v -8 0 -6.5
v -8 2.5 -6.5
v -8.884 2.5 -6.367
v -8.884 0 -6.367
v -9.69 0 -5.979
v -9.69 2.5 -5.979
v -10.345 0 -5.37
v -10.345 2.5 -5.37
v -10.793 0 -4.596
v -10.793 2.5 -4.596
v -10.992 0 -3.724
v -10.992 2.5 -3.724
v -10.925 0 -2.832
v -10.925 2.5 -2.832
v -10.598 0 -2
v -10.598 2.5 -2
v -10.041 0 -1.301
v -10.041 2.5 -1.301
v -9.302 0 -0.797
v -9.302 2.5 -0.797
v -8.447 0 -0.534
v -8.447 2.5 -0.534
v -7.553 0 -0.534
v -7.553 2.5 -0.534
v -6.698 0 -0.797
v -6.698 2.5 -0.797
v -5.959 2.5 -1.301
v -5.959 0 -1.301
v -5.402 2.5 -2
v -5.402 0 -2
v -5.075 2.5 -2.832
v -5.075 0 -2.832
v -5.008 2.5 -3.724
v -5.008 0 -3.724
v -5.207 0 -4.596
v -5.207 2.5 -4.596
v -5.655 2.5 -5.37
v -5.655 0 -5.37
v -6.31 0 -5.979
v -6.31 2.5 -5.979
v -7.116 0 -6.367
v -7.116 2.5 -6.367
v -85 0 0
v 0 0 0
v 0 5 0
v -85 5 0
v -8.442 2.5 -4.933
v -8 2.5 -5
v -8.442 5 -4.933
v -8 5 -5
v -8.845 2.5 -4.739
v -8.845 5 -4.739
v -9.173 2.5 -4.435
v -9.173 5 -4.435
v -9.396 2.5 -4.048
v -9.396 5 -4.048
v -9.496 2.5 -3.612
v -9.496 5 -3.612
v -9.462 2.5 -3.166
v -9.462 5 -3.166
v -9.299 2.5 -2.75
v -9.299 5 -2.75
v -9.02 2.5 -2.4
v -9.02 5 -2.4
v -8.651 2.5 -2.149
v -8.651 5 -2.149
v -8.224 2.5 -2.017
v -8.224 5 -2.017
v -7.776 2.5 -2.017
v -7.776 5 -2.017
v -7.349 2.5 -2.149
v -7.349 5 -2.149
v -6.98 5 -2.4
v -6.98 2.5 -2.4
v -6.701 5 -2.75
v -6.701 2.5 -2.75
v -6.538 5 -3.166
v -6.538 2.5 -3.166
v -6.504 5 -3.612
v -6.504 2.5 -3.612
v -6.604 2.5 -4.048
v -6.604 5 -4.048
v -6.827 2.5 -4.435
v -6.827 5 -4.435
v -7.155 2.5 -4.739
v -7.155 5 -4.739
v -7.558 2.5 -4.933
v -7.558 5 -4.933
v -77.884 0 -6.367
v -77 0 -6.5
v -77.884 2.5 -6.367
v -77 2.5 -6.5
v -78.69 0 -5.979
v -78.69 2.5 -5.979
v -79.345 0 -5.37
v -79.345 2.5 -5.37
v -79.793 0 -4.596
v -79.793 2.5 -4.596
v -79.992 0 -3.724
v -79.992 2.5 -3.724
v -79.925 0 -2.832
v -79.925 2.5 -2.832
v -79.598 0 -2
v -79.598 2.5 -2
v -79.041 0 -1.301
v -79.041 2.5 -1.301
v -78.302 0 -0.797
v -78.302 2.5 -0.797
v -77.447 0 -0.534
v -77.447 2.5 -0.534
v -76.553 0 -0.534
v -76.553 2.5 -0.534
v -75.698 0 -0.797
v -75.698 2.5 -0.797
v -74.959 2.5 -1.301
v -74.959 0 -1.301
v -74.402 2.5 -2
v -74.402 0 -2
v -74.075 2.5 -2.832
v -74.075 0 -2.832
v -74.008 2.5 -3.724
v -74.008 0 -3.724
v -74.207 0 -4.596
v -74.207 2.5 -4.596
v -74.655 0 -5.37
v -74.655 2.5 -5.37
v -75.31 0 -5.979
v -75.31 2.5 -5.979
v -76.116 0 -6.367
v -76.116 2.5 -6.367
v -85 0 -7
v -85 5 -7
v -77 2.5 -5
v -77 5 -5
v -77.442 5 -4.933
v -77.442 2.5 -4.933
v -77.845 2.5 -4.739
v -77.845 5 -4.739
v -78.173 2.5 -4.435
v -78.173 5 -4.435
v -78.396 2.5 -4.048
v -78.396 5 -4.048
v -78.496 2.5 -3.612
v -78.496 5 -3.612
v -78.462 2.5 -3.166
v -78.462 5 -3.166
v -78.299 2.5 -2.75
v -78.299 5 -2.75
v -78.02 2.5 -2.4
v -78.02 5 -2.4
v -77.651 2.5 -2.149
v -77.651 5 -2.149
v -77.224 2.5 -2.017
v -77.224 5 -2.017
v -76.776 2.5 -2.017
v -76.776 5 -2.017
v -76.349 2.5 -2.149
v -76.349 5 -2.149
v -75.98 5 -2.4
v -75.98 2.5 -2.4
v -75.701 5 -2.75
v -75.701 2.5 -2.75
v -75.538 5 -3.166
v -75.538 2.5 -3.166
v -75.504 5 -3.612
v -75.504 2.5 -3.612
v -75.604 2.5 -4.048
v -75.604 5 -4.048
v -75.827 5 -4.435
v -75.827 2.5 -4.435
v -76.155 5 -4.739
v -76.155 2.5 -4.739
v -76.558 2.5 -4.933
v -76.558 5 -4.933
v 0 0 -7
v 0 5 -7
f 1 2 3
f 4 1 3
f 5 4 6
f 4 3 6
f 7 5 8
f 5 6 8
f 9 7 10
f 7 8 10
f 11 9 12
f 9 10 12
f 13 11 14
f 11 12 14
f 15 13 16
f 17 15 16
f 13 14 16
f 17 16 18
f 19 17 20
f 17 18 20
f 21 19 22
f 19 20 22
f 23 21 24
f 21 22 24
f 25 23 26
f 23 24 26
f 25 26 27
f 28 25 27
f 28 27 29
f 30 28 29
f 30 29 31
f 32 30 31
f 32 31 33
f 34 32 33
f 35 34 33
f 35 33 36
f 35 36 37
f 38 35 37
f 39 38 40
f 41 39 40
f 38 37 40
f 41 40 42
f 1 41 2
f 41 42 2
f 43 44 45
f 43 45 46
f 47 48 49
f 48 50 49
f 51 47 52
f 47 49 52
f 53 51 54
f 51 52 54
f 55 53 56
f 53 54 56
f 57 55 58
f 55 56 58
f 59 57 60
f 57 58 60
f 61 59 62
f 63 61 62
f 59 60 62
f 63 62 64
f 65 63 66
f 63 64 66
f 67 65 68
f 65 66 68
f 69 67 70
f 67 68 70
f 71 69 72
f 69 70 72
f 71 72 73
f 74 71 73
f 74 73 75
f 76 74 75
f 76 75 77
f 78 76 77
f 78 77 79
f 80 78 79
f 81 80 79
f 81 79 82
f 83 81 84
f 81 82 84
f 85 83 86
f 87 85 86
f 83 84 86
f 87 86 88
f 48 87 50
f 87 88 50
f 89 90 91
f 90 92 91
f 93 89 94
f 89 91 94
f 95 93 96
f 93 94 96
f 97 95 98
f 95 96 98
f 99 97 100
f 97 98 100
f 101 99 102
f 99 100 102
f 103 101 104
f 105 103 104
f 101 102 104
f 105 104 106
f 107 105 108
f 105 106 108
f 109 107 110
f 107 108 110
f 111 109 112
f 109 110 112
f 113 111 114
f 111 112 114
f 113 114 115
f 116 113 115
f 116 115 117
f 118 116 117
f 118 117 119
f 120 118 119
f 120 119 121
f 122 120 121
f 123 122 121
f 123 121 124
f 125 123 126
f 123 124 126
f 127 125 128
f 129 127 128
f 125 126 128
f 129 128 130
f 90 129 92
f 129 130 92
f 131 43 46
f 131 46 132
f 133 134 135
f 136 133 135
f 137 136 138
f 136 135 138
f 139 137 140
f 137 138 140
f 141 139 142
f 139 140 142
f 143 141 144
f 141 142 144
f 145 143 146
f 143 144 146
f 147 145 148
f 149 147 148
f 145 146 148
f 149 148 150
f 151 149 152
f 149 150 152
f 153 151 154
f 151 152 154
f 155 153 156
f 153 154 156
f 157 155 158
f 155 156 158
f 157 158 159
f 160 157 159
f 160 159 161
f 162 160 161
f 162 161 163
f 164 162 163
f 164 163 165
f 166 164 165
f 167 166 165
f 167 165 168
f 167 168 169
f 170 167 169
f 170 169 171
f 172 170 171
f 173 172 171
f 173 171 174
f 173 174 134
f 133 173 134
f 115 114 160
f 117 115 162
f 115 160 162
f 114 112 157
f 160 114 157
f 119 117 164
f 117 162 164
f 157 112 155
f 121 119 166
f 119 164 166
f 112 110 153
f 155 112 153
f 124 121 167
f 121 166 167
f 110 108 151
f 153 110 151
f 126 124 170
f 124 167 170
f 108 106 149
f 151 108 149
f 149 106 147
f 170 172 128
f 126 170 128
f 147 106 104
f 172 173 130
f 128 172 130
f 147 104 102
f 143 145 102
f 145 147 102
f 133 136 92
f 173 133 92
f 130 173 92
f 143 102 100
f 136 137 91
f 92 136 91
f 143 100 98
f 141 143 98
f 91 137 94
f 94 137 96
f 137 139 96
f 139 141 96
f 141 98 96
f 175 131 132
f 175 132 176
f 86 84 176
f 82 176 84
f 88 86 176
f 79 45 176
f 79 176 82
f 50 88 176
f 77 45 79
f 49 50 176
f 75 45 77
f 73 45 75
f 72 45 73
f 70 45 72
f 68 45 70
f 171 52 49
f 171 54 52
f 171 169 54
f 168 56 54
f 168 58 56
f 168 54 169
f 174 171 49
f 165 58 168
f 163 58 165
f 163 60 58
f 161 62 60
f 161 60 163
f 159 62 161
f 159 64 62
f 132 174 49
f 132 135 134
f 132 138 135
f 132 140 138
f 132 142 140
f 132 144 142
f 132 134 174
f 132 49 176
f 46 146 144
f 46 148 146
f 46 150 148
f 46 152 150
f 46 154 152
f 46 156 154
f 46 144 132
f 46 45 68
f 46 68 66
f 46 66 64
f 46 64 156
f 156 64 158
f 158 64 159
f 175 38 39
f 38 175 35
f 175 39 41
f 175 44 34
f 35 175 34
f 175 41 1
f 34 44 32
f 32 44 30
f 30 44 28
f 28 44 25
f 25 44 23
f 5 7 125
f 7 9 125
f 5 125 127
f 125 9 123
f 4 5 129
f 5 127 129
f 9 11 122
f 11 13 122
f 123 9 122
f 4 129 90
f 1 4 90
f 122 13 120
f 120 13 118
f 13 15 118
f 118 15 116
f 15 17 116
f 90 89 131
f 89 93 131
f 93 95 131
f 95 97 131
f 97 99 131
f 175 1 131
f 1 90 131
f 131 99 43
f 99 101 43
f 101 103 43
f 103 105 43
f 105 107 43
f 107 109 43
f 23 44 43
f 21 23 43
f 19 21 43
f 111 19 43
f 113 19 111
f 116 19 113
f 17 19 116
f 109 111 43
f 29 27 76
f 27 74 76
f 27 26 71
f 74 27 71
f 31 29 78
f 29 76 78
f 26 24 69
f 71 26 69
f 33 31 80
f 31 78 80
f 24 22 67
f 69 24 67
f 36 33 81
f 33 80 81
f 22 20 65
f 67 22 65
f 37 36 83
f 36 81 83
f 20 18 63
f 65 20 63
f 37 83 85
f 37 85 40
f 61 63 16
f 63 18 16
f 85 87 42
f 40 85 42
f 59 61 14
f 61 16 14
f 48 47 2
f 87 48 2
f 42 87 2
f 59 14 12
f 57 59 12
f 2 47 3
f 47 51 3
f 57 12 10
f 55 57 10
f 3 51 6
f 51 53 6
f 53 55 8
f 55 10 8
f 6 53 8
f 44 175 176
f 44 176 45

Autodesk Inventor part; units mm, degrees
ref_plane "YZ Plane" through (0, 0, 0) normal (1, 0, 0) x (0, 1, 0)
ref_plane "XZ Plane" through (0, 0, 0) normal (0, 1, 0) x (-1, 0, 0)
ref_plane "XY Plane" through (0, 0, 0) normal (0, 0, 1) x (1, 0, 0)
sketch "Sketch1" plane through (0, 0, 0) normal (0, 1, 0) x (-1, 0, 0)
  line L0 (0, 0) -> (85, 0)
  line L1 (85, 0) -> (85, -7)
  line L2 (85, -7) -> (0, -7)
  line L3 (0, -7) -> (0, 0)
  line L4 (42.5, 3) -> (42.5, -16) construction
  line L5 (45, -3.5) -> (39, -3.5) construction
  point P0 (77, -3.5)
  point P1 (8, -3.5)
  dimension "d0" = 85
  dimension "d1" = 7
  dimension "d2" = 69
  dimension "d12" = 3.5
extrude "Extrusion1" add sketch "Sketch1" along normal blind 5
hole "Hole1" at (-77, 0, -3.5) at (-8, 0, -3.5) direction (0, 1, 0) diameter 3 end through all counterbore diameter 6 counterbore depth 2.5
properties part number "Rail" material "Wood (Birch)"
